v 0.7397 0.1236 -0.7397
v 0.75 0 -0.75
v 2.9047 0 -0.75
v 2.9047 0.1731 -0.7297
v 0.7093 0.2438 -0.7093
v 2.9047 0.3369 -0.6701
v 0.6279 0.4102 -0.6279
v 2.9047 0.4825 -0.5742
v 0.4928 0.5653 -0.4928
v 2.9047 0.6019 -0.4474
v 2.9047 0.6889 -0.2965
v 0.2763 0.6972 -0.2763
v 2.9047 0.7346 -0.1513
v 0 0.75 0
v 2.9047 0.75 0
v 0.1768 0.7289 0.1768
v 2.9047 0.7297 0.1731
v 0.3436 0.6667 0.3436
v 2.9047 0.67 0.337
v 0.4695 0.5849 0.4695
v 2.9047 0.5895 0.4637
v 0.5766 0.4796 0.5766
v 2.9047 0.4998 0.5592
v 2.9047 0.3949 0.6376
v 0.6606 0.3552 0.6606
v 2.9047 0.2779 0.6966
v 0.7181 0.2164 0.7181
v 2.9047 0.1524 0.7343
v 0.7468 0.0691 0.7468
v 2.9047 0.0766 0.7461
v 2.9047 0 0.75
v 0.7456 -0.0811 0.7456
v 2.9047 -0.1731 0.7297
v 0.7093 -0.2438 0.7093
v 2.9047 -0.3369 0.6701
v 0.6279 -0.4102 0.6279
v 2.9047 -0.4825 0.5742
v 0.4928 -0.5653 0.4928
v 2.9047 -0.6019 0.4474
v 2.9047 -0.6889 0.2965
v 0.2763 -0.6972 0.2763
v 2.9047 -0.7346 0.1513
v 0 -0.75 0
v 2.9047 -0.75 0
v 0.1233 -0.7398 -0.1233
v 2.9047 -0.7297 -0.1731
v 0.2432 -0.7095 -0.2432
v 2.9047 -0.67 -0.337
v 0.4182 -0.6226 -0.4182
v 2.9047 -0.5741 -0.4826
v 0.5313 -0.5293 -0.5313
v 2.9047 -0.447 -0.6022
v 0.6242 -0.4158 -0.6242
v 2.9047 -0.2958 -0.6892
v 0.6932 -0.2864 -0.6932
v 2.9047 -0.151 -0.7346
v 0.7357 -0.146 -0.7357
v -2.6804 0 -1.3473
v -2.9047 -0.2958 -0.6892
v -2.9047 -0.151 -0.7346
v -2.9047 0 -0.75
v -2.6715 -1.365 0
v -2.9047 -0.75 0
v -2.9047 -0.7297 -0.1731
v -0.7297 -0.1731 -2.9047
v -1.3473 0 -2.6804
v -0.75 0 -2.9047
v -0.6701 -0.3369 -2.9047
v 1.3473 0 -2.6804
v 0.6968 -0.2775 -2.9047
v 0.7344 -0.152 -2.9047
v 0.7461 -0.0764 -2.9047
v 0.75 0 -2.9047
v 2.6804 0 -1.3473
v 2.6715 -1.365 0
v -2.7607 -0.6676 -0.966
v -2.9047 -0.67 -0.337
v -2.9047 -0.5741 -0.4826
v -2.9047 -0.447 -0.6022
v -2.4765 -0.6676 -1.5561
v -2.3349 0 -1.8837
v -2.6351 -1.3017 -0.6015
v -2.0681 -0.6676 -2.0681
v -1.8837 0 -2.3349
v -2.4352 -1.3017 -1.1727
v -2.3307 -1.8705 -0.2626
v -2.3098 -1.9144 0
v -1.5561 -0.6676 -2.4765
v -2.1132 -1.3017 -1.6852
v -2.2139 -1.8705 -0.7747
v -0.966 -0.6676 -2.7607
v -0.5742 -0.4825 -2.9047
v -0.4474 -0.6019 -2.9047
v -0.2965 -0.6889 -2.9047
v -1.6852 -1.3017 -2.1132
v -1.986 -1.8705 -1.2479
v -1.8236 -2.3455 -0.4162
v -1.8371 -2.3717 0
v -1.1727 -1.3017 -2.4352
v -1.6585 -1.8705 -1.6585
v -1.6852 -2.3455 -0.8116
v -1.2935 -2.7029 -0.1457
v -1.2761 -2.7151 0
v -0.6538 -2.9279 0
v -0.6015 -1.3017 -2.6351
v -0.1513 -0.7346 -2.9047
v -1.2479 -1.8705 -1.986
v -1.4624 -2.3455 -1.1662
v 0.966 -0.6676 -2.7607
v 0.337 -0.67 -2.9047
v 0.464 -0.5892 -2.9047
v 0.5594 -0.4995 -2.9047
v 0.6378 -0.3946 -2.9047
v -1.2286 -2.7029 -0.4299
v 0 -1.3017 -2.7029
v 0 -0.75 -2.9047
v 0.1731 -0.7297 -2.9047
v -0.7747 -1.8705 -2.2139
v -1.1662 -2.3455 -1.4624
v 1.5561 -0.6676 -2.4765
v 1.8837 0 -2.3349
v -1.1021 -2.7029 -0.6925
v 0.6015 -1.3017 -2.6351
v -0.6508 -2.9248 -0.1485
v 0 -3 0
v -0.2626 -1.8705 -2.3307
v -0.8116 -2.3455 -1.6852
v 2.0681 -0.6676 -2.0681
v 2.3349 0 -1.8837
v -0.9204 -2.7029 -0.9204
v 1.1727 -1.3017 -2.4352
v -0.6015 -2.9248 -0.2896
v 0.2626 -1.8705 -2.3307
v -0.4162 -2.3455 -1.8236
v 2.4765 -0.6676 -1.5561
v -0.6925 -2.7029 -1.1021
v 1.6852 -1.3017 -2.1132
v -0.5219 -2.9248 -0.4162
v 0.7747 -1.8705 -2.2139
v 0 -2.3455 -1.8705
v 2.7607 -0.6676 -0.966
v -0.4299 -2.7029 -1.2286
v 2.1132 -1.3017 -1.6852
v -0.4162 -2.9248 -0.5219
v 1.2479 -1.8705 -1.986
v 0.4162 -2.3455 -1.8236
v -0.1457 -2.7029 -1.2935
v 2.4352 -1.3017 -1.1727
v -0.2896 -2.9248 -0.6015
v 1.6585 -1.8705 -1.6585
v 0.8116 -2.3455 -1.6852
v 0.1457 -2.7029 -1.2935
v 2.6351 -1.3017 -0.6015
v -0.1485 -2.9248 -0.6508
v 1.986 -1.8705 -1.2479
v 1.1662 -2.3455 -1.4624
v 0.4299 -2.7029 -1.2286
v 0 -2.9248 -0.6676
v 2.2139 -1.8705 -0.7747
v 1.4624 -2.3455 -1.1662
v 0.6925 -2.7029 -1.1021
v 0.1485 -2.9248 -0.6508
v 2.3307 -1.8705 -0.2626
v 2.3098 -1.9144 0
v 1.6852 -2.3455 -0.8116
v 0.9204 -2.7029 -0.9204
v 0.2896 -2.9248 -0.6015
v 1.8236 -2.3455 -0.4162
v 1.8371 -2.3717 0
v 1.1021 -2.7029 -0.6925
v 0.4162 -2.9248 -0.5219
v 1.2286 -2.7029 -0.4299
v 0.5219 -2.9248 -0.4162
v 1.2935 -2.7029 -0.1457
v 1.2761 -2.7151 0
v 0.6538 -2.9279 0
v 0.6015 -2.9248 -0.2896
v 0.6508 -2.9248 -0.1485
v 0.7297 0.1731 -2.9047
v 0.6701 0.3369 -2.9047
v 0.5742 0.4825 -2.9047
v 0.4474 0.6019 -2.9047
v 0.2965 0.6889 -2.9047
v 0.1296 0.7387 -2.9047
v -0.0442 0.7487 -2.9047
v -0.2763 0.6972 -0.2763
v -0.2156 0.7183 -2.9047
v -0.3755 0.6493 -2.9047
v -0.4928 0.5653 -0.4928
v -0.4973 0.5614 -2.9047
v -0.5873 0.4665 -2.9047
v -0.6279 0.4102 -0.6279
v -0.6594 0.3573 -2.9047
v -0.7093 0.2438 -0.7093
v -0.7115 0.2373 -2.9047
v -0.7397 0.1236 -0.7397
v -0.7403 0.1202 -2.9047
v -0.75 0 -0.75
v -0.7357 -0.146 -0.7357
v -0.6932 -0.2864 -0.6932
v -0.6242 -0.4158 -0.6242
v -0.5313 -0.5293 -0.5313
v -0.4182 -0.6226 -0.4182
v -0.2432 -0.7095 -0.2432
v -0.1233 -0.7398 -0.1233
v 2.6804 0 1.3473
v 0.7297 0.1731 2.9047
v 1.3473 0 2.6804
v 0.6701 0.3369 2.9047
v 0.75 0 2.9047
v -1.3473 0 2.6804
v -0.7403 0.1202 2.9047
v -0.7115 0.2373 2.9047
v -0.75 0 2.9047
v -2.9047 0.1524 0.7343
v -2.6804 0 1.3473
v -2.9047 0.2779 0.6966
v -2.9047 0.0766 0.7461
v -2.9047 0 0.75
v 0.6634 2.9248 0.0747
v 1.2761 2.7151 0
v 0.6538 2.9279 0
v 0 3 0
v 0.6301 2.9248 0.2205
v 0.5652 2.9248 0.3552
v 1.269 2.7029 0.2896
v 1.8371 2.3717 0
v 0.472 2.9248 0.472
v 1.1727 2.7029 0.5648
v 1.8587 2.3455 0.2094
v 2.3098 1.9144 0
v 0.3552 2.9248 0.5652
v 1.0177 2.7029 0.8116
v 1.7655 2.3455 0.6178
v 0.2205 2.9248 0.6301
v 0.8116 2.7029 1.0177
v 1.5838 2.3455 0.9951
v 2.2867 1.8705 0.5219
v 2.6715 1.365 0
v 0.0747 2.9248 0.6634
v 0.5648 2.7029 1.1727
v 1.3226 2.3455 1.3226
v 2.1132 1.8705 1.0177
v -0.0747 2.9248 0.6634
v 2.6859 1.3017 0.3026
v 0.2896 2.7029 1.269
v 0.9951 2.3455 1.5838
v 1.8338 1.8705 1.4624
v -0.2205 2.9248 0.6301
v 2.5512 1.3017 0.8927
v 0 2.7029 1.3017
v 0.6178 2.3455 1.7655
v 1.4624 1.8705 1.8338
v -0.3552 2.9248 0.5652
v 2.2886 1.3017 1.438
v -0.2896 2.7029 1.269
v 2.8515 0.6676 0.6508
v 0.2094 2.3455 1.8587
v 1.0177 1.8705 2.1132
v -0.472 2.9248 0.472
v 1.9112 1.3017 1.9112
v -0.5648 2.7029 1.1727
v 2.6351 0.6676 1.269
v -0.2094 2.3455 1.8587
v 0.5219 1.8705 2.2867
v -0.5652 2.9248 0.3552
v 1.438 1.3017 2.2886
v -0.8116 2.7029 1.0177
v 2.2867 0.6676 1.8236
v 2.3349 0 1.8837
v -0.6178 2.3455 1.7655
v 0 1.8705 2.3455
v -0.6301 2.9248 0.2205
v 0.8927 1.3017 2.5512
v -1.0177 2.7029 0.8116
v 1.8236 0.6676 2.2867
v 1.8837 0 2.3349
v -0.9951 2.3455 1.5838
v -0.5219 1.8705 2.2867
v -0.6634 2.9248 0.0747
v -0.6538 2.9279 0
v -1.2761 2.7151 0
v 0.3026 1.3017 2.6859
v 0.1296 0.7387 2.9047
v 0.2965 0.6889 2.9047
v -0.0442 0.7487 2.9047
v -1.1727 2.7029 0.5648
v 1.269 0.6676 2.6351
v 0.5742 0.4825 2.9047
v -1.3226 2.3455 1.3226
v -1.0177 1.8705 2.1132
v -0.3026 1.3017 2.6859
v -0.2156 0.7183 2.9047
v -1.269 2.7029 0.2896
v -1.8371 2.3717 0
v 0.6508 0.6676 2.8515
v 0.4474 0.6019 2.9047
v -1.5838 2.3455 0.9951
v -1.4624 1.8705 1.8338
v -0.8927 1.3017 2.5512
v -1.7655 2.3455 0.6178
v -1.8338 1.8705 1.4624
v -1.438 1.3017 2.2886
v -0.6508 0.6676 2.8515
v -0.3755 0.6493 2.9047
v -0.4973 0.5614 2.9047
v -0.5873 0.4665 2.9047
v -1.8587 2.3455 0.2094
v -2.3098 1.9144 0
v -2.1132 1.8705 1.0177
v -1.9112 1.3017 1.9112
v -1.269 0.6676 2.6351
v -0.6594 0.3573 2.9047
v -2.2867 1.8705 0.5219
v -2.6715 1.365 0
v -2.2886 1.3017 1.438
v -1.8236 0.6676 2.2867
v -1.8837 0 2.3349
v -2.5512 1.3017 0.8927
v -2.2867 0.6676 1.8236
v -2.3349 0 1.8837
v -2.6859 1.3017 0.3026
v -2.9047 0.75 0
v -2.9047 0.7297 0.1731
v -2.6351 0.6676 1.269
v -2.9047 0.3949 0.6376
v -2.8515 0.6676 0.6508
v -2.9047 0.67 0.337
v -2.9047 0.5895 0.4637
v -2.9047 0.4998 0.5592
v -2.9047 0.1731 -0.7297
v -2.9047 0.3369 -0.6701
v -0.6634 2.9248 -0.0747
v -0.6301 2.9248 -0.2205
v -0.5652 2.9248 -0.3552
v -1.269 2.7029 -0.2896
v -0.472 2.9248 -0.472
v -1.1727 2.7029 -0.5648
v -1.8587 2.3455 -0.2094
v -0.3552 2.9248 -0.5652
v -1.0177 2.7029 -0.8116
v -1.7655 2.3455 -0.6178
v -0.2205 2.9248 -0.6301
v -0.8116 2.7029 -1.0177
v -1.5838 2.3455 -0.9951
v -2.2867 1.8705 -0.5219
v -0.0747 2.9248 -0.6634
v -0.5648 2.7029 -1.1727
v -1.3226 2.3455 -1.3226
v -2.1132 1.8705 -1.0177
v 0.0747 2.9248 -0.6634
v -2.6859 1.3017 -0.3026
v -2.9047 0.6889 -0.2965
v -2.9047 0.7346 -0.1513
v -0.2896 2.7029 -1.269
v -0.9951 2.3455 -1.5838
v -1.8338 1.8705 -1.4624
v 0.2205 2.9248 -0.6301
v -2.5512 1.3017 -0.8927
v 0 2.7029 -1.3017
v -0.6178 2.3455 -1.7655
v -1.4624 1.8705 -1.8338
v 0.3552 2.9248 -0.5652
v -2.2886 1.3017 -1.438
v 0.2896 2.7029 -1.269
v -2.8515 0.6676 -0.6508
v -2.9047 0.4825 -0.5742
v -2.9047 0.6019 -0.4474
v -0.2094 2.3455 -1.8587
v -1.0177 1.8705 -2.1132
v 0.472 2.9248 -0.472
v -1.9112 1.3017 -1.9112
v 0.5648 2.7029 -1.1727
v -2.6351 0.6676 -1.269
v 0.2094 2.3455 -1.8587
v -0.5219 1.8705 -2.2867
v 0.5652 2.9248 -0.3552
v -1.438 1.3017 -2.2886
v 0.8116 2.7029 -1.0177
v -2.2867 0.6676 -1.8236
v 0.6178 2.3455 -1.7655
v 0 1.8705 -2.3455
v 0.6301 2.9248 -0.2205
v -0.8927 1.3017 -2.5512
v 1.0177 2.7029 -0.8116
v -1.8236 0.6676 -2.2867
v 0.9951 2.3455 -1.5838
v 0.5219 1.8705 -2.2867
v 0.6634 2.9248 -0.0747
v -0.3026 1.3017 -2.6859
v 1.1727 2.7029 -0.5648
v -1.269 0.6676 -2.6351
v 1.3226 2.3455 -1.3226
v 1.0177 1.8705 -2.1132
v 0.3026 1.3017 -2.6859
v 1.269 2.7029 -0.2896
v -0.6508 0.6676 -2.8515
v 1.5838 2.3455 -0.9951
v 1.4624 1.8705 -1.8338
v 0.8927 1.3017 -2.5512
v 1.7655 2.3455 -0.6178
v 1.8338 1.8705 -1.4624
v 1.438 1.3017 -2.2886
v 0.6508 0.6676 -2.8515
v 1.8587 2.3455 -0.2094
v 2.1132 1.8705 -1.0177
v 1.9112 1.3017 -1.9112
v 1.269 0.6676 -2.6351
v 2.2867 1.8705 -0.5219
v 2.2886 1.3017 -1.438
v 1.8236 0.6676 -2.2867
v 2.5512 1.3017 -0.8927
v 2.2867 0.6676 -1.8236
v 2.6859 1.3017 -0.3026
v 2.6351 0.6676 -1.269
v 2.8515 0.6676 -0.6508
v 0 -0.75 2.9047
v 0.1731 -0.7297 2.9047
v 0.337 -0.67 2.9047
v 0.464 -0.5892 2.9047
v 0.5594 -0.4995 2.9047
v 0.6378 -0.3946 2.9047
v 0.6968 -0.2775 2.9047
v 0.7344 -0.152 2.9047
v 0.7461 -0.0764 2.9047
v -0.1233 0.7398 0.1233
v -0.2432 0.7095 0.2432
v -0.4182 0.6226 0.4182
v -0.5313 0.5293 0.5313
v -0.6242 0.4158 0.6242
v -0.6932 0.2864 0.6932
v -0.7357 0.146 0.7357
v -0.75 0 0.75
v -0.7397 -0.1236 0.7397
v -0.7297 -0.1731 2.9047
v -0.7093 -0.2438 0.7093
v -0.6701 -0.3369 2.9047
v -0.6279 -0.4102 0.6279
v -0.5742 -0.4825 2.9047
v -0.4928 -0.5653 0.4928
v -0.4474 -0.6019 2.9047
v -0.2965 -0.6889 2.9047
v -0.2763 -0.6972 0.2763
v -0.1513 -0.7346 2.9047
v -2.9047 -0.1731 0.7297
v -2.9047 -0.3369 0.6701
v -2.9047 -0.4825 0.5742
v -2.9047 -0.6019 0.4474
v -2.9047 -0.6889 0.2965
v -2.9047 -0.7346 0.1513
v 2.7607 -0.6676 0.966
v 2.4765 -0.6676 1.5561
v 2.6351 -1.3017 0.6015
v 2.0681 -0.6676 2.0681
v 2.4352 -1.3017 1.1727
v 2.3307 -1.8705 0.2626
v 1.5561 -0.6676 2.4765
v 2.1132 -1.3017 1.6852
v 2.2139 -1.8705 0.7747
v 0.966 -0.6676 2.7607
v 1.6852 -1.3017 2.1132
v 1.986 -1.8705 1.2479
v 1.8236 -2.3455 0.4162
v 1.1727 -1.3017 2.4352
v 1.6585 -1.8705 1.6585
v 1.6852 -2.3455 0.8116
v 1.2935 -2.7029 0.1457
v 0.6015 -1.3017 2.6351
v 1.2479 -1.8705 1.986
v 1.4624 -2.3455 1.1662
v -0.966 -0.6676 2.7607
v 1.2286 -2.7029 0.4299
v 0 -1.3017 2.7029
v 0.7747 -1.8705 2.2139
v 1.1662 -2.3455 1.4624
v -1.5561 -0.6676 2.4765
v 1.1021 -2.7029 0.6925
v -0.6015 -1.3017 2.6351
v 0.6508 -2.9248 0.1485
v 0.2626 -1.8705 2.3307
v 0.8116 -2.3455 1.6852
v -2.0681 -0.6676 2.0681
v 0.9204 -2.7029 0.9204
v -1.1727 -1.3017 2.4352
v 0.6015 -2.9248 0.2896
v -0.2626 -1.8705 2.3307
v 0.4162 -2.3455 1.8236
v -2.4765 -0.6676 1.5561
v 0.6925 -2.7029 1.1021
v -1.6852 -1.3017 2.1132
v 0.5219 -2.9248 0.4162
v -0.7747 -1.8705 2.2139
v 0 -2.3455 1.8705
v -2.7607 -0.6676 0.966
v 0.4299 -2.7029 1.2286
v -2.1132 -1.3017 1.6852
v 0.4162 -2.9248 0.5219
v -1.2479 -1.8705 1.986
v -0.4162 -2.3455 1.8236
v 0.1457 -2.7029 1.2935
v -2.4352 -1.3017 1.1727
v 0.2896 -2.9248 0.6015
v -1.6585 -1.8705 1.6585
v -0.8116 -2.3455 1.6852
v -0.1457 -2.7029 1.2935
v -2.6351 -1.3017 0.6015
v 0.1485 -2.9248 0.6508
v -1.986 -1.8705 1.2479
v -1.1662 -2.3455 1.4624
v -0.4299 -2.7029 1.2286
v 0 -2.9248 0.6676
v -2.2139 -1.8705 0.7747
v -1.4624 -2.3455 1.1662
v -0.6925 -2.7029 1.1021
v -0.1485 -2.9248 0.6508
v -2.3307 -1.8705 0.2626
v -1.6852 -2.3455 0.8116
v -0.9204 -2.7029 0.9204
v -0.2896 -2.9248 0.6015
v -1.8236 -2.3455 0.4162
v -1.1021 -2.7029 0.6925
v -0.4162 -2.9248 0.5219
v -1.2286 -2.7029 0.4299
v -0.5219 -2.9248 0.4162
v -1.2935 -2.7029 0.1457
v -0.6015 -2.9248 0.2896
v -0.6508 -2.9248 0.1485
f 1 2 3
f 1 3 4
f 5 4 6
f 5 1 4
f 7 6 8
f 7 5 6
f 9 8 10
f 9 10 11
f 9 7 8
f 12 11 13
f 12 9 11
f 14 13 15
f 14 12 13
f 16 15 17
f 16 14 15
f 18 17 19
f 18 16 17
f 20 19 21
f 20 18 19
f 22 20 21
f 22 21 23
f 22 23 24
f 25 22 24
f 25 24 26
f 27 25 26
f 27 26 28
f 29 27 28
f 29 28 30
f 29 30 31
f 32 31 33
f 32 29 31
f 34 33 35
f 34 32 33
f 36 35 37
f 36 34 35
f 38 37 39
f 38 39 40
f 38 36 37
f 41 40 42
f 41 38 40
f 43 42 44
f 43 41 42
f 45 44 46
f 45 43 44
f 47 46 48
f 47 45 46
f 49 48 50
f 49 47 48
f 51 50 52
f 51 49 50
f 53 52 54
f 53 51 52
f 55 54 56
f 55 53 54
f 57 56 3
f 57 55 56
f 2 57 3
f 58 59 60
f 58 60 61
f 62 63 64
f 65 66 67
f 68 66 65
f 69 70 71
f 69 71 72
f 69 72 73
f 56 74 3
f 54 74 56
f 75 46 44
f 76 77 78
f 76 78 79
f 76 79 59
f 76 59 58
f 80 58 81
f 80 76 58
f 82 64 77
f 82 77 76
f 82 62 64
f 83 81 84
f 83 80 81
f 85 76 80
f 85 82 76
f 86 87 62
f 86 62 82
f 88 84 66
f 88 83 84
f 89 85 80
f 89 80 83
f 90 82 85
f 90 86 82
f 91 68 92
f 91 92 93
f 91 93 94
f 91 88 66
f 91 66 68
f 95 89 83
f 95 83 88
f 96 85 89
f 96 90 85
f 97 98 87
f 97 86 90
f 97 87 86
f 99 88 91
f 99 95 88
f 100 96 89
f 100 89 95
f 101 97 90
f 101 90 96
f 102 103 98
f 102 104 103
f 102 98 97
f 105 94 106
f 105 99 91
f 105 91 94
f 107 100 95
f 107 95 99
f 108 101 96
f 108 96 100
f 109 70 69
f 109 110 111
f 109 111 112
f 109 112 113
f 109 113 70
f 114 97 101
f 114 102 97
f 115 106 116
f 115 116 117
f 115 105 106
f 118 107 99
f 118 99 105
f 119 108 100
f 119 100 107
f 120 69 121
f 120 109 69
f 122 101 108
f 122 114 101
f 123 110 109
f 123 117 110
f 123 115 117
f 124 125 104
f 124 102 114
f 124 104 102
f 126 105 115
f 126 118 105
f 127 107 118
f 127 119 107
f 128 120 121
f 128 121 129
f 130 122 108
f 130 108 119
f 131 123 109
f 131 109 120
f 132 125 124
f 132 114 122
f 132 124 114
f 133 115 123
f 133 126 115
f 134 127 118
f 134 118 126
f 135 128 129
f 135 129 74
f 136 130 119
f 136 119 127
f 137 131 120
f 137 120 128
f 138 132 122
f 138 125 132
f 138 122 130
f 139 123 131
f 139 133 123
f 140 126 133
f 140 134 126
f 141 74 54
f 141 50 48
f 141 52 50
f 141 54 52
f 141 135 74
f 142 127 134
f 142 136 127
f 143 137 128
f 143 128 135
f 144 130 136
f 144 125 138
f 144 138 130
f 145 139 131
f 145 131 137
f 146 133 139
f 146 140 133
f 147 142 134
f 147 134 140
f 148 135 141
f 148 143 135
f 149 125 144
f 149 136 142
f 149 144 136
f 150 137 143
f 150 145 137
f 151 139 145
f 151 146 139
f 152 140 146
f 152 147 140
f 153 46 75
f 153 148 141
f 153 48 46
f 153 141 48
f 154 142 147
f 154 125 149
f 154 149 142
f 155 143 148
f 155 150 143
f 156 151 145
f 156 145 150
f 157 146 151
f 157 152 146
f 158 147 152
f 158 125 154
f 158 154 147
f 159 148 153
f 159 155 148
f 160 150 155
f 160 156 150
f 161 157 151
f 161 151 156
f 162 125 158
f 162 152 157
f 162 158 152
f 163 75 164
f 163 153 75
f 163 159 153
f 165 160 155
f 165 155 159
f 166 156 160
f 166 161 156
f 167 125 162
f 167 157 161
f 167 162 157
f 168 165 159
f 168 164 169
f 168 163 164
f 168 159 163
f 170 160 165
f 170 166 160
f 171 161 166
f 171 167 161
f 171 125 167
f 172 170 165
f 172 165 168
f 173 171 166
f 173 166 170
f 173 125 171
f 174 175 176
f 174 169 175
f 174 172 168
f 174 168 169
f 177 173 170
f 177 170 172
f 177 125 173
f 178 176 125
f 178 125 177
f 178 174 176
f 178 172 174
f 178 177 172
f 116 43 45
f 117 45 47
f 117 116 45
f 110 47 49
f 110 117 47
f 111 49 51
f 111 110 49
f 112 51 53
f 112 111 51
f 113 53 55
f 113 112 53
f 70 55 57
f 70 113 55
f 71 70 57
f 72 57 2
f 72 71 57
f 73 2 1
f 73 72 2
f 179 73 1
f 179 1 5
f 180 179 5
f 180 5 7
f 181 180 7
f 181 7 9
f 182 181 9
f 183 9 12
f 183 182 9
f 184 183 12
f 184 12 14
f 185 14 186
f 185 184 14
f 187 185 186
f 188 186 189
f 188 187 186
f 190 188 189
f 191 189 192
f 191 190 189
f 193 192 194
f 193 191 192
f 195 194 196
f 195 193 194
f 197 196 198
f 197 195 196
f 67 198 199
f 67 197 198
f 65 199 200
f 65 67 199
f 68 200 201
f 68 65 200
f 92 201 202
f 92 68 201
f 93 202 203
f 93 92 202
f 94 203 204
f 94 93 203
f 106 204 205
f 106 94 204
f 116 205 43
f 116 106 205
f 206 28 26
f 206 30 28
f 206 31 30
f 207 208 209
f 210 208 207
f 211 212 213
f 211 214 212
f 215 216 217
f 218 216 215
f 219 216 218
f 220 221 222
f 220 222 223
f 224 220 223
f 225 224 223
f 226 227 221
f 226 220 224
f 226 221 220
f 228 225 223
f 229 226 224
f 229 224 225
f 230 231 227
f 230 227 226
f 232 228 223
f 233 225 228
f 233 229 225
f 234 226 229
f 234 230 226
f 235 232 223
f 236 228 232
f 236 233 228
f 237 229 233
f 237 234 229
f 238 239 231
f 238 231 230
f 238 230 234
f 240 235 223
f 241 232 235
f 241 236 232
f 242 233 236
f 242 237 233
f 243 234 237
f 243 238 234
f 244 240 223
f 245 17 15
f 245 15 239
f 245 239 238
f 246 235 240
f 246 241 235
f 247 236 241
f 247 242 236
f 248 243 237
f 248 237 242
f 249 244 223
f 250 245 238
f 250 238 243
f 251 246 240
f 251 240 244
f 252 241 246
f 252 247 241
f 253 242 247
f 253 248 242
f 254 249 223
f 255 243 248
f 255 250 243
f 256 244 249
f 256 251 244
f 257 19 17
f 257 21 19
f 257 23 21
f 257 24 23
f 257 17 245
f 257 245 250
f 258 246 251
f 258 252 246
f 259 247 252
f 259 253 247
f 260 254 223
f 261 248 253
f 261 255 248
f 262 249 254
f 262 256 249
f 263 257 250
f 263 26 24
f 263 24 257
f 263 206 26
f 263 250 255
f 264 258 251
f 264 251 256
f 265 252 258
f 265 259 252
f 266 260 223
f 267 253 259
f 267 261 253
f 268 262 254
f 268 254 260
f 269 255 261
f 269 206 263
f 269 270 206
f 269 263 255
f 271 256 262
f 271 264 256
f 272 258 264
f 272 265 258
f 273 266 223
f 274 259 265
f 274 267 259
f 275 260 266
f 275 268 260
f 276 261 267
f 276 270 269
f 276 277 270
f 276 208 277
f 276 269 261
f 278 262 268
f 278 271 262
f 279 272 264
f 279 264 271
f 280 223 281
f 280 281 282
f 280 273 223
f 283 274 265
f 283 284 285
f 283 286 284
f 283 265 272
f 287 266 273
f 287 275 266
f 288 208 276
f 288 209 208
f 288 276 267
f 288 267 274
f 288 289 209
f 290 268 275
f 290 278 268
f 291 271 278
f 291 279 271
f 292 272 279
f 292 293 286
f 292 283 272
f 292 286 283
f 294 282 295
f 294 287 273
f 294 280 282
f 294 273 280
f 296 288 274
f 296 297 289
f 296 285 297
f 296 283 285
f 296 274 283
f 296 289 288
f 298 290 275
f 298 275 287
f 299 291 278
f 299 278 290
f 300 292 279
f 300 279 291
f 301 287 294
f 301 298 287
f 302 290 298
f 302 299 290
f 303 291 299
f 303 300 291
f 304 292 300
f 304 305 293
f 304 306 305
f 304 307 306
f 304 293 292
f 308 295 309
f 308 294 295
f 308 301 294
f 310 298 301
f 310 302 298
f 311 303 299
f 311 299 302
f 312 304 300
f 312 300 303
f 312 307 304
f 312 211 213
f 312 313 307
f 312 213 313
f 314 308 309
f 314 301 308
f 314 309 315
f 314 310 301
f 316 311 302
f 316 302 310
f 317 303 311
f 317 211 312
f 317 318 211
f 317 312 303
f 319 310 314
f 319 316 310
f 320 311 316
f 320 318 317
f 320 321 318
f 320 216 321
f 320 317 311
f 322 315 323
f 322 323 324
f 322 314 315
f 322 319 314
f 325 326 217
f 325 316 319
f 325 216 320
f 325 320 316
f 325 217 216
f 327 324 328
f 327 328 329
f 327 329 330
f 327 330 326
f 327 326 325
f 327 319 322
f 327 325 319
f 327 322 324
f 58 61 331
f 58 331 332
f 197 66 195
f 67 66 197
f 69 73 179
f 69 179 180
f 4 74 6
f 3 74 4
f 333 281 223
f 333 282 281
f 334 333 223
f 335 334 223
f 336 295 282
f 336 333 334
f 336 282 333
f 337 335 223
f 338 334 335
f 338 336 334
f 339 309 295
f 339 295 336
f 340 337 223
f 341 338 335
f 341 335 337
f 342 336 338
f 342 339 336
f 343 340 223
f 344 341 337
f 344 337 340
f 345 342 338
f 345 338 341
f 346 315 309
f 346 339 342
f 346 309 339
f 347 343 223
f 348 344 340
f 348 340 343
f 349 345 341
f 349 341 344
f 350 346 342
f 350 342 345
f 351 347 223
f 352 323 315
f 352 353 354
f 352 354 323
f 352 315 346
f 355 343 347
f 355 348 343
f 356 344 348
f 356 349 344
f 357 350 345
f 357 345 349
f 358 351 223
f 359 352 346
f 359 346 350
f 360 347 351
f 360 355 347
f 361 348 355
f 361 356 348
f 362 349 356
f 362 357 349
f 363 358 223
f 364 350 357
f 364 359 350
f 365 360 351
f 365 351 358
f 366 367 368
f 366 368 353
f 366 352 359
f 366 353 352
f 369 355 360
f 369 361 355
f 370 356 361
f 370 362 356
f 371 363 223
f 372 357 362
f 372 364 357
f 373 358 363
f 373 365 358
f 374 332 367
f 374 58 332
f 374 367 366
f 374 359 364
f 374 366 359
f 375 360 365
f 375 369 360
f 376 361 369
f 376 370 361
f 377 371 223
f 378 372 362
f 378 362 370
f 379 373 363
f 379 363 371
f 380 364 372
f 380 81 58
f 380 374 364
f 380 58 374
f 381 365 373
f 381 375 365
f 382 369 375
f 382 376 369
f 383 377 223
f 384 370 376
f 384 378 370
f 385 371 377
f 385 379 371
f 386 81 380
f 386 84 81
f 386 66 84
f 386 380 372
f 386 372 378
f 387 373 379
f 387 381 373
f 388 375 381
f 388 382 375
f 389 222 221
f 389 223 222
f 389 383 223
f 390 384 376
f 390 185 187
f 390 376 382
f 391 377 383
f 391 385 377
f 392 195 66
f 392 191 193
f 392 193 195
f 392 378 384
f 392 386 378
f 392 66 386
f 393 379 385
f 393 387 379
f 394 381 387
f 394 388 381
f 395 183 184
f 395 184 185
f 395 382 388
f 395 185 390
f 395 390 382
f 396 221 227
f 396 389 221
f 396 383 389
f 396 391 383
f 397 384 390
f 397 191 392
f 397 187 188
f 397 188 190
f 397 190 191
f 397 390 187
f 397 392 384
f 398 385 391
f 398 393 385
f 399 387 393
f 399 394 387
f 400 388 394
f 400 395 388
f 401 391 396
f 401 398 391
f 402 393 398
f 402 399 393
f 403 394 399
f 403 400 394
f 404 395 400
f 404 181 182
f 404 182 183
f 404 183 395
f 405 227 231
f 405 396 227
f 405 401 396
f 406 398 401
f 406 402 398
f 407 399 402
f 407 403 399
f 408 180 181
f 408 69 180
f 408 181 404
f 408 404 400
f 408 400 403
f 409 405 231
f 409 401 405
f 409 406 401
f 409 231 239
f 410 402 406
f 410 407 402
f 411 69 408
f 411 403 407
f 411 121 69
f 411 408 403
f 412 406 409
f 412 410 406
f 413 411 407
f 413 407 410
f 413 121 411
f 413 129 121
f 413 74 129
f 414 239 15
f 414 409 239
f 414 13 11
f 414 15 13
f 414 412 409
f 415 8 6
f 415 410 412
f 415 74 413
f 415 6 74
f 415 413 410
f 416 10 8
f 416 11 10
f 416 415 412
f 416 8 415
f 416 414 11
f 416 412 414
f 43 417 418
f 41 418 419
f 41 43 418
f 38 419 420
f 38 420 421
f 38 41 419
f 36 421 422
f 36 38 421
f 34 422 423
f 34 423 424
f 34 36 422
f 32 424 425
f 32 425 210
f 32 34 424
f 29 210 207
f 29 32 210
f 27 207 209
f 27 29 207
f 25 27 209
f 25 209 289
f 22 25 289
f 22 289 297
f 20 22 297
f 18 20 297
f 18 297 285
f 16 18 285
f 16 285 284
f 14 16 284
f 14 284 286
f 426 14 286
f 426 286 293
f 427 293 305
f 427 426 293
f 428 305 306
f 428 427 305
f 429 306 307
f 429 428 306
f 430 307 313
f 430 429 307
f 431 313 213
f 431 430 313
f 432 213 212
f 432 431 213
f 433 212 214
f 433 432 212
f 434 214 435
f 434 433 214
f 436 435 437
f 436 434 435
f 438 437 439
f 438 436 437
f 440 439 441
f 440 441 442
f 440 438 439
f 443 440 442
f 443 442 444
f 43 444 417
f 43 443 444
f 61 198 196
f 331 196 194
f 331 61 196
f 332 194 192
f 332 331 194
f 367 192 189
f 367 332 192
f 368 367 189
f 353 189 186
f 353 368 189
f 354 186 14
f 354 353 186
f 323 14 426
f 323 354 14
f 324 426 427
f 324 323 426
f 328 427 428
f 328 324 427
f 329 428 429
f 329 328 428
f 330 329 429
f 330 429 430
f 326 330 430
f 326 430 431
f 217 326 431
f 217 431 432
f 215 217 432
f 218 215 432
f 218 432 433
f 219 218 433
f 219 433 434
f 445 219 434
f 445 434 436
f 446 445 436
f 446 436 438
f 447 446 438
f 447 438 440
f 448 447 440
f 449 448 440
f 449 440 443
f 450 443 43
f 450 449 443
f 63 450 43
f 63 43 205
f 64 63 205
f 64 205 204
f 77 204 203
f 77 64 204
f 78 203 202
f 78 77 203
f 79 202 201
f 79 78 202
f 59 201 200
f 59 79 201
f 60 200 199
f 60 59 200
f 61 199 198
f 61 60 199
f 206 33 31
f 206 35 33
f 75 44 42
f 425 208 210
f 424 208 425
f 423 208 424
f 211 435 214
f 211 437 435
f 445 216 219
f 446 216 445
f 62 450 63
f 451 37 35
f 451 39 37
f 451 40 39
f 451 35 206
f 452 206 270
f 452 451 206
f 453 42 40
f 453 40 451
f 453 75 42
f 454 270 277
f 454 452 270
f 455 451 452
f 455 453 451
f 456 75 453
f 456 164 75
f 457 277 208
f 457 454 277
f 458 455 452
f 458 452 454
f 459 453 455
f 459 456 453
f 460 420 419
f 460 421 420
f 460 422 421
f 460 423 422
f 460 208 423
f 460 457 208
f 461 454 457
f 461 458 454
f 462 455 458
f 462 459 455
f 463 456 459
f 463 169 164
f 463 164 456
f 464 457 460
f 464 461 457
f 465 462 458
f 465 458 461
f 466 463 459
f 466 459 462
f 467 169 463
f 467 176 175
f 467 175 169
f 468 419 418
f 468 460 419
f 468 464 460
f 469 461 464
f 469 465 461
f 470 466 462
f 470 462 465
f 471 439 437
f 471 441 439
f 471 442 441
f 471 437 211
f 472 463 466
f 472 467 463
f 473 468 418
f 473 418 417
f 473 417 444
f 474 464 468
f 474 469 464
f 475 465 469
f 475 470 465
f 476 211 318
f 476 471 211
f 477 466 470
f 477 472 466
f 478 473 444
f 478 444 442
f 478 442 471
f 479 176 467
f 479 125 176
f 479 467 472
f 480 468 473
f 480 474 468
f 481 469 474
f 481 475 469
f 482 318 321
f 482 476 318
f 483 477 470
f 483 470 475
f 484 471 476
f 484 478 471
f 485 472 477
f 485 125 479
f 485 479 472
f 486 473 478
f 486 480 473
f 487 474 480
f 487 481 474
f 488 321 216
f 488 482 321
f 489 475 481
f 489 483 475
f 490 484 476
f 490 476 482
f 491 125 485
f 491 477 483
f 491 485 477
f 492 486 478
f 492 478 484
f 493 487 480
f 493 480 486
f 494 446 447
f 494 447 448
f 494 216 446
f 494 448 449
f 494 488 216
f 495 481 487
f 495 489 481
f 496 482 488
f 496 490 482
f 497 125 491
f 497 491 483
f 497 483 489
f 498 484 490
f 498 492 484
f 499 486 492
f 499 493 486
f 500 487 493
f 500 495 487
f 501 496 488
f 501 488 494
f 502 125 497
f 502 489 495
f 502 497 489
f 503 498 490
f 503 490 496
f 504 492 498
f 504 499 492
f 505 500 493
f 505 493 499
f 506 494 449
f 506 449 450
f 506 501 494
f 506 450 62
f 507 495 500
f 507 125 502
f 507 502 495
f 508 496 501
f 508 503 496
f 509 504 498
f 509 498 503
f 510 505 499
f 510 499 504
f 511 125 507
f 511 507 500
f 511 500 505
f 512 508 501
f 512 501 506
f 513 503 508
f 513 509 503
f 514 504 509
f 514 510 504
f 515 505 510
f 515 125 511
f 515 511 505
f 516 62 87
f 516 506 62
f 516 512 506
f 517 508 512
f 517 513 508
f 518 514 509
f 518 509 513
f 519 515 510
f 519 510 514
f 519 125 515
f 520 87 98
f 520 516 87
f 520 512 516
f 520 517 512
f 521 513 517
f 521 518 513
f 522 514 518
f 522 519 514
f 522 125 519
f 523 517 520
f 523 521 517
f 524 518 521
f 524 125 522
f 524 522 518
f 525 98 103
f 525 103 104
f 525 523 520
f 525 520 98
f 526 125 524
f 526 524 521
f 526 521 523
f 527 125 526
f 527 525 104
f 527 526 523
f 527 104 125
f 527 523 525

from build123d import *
from build123d.topology import SkipClean

# Parameters (mm, degrees)
CUT_EXTRUDE1_DEPTH      = 6.196152423
CUT_EXTRUDE1_DEPTH_BACK = 6.196152423
SKETCH2_R               = 0.75
CUT_EXTRUDE2_DEPTH      = 6.141741007
CUT_EXTRUDE2_DEPTH_BACK = 6.141741007
SKETCH3_R               = 0.75


with BuildPart() as part:
    # Sketch1 → Revolve1 (revolve)
    with SkipClean():  # the faces are left unmerged after this step: merging them gives an invalid solid
        with BuildSketch(Plane.XY):
            with BuildLine():
                ThreePointArc((3, 0), (2.121320344, 2.121320344), (0, 3))
                Line((0, 3), (0, -3))
                ThreePointArc((0, -3), (2.121320344, -2.121320344), (3, 0))
            make_face()
            with BuildLine():
                Line((0, -3), (0, 3))
                ThreePointArc((0, 3), (-3, 0), (0, -3))
            make_face()
        revolve(axis=Axis((0, 3, 0), (0, -1, 0)))

    # Sketch2 → Cut-Extrude1 (cut, two sides: drawn at the far end of the back side and taken through both)
    with SkipClean():  # the faces are left unmerged after this step: merging them gives an invalid solid
        with BuildSketch(Plane(origin=(0, 0, 0), x_dir=(0, 0, -1), z_dir=(1, 0, 0)).offset(-CUT_EXTRUDE1_DEPTH_BACK)):
            Circle(SKETCH2_R)
        extrude(amount=CUT_EXTRUDE1_DEPTH + CUT_EXTRUDE1_DEPTH_BACK, mode=Mode.SUBTRACT)

    # Sketch3 → Cut-Extrude2 (cut, two sides: drawn at the far end of the back side and taken through both)
    with SkipClean():  # the faces are left unmerged after this step: merging them gives an invalid solid
        with BuildSketch(Plane.XY.offset(-CUT_EXTRUDE2_DEPTH_BACK)):
            with Locations(Location((0, 0, 0), (0, 0, 270))):
                Circle(SKETCH3_R)
        extrude(amount=CUT_EXTRUDE2_DEPTH + CUT_EXTRUDE2_DEPTH_BACK, mode=Mode.SUBTRACT)


solid = part.part
